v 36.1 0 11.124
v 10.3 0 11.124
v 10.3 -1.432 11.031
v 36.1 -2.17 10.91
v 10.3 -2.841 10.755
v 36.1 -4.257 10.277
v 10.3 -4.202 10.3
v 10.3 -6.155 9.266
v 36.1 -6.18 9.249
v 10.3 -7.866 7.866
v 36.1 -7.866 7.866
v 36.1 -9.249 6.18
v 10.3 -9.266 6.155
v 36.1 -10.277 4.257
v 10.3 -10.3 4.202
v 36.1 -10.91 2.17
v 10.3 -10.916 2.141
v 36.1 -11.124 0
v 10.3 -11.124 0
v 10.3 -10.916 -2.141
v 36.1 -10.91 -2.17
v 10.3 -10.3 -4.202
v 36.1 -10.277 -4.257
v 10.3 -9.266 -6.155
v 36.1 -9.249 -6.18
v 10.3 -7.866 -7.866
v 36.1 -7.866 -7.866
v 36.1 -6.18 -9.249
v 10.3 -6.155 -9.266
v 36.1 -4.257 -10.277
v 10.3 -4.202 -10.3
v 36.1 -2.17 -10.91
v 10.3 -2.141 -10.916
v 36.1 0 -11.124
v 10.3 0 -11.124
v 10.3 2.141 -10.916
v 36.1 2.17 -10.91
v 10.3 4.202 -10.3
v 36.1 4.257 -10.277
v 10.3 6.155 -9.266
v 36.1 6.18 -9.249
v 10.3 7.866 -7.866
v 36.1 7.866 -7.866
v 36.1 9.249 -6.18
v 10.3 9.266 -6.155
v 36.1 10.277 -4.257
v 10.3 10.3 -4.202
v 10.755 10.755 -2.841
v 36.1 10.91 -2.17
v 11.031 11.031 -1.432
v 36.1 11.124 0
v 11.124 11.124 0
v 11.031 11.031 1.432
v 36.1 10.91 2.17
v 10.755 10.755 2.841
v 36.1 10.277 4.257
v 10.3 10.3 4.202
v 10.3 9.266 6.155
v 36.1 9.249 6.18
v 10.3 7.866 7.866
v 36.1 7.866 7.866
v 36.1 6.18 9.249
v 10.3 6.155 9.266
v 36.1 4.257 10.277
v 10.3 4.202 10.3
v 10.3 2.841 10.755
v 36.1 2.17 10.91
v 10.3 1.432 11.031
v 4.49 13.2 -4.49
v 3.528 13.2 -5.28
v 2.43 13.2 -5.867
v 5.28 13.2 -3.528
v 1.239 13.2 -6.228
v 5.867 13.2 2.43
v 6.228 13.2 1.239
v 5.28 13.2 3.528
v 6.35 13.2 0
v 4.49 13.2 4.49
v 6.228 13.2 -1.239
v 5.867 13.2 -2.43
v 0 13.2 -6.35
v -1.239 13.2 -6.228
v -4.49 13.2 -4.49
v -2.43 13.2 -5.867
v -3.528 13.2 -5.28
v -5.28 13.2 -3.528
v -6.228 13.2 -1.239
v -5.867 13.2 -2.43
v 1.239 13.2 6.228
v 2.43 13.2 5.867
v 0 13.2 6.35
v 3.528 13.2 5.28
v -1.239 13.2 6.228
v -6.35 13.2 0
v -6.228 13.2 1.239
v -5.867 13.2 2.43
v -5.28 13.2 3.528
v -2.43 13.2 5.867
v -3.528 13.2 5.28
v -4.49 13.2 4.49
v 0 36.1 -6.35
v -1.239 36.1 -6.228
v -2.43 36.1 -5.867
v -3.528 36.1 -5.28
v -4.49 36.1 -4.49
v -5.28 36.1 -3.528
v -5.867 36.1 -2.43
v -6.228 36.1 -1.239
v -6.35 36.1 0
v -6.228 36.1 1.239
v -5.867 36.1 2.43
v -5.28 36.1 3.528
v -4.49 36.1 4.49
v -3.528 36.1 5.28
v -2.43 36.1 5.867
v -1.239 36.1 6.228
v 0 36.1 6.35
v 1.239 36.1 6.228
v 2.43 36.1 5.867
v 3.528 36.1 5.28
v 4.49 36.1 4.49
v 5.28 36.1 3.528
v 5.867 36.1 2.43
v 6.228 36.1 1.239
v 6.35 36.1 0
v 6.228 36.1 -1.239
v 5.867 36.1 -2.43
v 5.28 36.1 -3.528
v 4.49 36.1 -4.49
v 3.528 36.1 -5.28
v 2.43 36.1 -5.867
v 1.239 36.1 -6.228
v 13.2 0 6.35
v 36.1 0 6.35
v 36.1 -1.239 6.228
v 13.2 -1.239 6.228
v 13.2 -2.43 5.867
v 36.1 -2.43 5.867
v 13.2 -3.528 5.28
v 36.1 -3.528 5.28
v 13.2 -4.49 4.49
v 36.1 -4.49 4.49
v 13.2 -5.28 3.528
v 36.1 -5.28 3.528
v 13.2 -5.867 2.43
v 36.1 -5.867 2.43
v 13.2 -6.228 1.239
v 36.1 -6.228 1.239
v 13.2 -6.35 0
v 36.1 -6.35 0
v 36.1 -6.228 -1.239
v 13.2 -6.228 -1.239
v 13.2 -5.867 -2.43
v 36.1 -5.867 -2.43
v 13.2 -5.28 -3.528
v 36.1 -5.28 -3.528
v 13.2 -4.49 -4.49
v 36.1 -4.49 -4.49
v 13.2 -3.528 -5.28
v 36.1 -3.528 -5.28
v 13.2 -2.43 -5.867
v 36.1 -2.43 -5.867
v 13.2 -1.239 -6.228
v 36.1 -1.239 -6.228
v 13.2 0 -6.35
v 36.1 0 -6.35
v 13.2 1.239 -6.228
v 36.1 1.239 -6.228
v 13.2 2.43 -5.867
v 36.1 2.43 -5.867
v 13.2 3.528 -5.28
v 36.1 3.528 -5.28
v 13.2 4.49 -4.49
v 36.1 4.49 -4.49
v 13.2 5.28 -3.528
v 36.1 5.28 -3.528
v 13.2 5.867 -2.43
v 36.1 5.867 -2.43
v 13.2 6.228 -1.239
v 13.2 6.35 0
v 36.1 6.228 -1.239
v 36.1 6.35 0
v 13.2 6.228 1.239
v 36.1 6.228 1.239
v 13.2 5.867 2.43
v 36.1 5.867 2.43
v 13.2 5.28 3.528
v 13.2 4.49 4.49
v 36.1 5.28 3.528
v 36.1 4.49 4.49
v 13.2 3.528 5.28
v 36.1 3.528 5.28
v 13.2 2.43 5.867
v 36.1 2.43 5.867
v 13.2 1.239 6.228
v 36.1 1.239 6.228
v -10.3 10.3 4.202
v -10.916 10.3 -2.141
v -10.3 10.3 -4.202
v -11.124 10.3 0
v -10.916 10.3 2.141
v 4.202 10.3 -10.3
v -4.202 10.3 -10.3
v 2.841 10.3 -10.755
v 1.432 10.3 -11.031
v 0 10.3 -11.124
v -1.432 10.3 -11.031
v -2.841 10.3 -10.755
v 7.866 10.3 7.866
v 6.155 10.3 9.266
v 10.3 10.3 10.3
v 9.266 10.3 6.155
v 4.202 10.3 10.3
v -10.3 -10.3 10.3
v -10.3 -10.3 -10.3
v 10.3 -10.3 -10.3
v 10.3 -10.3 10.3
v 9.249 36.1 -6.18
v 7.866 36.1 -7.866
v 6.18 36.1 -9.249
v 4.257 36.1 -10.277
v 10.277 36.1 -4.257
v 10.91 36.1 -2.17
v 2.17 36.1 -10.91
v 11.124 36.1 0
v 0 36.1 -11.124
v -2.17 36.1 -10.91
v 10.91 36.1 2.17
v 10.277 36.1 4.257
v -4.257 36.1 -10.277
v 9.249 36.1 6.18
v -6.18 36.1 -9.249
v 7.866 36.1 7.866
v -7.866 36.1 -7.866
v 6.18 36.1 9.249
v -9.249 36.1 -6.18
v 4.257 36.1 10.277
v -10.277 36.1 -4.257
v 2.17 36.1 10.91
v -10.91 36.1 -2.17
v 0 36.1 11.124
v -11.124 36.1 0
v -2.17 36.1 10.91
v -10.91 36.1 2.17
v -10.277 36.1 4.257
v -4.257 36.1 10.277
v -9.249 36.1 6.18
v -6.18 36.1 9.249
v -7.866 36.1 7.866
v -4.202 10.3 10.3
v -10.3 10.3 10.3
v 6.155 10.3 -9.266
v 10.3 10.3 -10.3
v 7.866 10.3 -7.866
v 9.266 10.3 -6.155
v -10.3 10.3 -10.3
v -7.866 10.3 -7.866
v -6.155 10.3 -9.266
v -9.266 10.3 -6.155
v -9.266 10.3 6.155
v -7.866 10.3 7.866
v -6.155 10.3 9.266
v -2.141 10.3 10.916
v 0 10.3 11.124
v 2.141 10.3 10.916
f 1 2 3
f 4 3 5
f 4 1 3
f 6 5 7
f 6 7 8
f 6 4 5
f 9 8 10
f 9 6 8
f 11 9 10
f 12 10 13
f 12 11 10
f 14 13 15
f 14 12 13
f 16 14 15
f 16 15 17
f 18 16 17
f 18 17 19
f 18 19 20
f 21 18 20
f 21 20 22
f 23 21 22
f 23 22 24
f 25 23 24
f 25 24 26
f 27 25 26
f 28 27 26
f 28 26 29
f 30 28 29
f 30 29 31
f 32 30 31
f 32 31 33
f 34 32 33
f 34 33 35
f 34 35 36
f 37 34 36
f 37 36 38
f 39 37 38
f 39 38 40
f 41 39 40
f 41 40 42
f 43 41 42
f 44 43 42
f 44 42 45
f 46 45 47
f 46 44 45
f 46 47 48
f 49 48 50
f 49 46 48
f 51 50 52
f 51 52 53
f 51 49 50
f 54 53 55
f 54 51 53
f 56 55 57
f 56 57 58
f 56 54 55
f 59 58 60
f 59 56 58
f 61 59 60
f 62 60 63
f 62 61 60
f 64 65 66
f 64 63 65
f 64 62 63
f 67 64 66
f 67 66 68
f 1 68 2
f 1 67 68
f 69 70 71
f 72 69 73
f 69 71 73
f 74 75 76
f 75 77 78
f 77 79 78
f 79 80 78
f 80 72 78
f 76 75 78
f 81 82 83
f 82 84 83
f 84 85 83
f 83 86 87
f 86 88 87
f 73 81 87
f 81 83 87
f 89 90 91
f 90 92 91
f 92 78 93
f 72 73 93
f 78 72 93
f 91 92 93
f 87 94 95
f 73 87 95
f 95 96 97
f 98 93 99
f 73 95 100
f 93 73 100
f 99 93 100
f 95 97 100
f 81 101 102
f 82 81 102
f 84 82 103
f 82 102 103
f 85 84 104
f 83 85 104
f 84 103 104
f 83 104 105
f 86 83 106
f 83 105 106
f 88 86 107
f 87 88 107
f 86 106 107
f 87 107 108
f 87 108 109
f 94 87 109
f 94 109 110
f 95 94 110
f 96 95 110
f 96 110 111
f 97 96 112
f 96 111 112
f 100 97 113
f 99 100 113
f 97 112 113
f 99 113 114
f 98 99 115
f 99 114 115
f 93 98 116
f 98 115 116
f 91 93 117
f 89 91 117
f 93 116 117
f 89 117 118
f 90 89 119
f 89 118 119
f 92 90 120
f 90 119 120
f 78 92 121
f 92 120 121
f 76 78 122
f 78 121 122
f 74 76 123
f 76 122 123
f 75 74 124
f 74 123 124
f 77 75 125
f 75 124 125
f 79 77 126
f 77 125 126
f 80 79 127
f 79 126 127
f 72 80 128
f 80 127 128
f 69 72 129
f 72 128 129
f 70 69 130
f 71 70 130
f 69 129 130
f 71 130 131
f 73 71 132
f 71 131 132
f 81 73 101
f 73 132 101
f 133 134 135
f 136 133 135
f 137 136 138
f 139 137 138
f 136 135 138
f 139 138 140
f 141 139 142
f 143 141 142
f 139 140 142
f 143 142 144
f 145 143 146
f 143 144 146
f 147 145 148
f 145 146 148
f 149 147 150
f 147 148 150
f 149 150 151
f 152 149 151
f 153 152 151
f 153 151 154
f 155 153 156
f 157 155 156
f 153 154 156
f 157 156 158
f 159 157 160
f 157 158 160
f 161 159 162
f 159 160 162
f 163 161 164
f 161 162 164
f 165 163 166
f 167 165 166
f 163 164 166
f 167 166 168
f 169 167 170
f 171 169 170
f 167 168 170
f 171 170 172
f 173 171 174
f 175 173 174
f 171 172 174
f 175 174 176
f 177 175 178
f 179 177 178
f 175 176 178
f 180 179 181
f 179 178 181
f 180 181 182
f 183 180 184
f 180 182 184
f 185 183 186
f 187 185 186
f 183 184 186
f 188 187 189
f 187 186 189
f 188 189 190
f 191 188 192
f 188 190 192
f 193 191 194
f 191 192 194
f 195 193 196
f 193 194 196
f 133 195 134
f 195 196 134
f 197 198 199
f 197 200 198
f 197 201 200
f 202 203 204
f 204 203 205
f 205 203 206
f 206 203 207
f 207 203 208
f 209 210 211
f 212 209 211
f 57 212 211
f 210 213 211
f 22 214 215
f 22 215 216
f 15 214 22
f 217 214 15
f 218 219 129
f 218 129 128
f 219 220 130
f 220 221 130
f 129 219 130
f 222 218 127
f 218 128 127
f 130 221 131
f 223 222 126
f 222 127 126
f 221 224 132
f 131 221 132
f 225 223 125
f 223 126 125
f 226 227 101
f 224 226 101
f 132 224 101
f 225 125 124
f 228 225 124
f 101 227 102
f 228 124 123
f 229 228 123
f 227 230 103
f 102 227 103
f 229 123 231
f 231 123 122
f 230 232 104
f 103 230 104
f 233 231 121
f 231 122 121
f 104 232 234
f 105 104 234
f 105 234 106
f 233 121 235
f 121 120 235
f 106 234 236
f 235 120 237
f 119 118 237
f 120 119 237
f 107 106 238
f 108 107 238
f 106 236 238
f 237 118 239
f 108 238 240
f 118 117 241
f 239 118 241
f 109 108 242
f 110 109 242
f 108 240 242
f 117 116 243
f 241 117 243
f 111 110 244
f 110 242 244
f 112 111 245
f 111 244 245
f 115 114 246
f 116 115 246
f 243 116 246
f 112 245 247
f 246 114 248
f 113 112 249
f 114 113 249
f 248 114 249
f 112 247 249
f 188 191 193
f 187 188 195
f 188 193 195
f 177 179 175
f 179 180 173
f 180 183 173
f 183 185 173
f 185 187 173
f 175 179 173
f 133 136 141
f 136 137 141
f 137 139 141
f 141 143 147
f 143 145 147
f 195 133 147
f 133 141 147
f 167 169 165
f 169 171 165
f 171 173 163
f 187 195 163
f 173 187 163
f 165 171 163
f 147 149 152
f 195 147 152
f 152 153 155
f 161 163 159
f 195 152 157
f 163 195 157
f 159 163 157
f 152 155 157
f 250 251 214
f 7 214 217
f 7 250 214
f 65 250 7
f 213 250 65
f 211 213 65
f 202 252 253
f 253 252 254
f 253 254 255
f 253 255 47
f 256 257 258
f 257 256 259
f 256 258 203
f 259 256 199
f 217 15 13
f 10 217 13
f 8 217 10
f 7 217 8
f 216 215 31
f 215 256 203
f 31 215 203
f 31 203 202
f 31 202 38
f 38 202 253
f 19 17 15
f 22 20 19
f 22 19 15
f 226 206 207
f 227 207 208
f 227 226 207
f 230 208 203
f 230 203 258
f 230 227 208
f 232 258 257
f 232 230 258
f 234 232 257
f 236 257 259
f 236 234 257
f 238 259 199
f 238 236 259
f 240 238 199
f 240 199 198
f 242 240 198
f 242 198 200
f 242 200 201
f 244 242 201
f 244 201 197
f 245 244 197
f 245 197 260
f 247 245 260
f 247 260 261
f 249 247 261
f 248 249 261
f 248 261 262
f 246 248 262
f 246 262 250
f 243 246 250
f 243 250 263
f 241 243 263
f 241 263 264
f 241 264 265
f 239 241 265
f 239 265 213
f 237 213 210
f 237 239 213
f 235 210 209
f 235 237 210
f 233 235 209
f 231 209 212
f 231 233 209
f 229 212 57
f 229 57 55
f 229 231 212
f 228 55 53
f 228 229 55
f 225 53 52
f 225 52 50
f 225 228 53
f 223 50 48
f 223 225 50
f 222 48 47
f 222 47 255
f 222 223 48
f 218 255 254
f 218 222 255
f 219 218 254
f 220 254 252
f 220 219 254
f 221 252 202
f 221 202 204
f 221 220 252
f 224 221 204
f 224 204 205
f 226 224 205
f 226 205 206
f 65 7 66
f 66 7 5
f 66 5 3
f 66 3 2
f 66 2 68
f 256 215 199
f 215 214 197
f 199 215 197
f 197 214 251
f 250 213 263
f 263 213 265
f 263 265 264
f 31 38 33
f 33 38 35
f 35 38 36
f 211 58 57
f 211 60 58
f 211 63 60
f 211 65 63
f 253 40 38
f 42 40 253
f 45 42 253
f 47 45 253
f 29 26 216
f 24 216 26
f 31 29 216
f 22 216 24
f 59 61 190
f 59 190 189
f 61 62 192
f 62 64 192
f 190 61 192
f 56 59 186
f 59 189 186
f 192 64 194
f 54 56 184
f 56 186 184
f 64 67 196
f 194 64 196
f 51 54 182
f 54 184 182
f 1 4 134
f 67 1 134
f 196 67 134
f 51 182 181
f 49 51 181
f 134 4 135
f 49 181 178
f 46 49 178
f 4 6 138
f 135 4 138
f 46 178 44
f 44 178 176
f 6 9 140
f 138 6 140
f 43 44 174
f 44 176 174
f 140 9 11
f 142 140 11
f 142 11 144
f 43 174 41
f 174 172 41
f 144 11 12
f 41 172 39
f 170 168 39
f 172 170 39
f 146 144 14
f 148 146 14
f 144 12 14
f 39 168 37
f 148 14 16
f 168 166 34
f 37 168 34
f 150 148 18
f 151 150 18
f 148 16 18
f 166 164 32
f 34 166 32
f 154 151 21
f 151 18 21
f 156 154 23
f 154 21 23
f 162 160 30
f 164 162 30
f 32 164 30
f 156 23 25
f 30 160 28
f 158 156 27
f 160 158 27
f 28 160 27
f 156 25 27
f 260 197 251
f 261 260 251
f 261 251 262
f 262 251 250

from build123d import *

# Parameters (mm, degrees)
BLOCK_SKETCH_W    = 20.6
BLOCK_SKETCH_H    = 20.6
BLOCK_DEPTH       = 10.3
ARM_X_SKETCH_W    = 25.8
ARM_X_SKETCH_H    = 11.124
ARM_Y_SKETCH_W    = 11.124
ARM_Y_SKETCH_H    = 25.8
SOCKET_X_SKETCH_W = 23.9
SOCKET_X_SKETCH_H = 6.35
SOCKET_Y_SKETCH_W = 6.35
SOCKET_Y_SKETCH_H = 23.9


with BuildPart() as part:
    # Block Sketch → Block (new, symmetric)
    with BuildSketch(Plane.XY):
        Rectangle(BLOCK_SKETCH_W, BLOCK_SKETCH_H)
    extrude(amount=BLOCK_DEPTH, both=True)

    # Arm X Sketch → Arm X (revolve)
    with BuildSketch(Plane.XY):
        with Locations((23.2, 5.562)):
            Rectangle(ARM_X_SKETCH_W, ARM_X_SKETCH_H)
    revolve(axis=Axis((-1000, 0, 0), (1, 0, 0)))

    # Arm Y Sketch → Arm Y (revolve)
    with BuildSketch(Plane.XY):
        with Locations((5.562, 23.2)):
            Rectangle(ARM_Y_SKETCH_W, ARM_Y_SKETCH_H)
    revolve(axis=Axis((0, -500, 0), (0, 1, 0)))

    # Socket X Sketch → Socket X (revolve, cut)
    with BuildSketch(Plane.XY):
        with Locations((25.15, 3.175)):
            Rectangle(SOCKET_X_SKETCH_W, SOCKET_X_SKETCH_H)
    revolve(axis=Axis((-1000, 0, 0), (1, 0, 0)), mode=Mode.SUBTRACT)

    # Socket Y Sketch → Socket Y (revolve, cut)
    with BuildSketch(Plane.XY):
        with Locations((3.175, 25.15)):
            Rectangle(SOCKET_Y_SKETCH_W, SOCKET_Y_SKETCH_H)
    revolve(axis=Axis((0, -500, 0), (0, 1, 0)), mode=Mode.SUBTRACT)


solid = part.part
